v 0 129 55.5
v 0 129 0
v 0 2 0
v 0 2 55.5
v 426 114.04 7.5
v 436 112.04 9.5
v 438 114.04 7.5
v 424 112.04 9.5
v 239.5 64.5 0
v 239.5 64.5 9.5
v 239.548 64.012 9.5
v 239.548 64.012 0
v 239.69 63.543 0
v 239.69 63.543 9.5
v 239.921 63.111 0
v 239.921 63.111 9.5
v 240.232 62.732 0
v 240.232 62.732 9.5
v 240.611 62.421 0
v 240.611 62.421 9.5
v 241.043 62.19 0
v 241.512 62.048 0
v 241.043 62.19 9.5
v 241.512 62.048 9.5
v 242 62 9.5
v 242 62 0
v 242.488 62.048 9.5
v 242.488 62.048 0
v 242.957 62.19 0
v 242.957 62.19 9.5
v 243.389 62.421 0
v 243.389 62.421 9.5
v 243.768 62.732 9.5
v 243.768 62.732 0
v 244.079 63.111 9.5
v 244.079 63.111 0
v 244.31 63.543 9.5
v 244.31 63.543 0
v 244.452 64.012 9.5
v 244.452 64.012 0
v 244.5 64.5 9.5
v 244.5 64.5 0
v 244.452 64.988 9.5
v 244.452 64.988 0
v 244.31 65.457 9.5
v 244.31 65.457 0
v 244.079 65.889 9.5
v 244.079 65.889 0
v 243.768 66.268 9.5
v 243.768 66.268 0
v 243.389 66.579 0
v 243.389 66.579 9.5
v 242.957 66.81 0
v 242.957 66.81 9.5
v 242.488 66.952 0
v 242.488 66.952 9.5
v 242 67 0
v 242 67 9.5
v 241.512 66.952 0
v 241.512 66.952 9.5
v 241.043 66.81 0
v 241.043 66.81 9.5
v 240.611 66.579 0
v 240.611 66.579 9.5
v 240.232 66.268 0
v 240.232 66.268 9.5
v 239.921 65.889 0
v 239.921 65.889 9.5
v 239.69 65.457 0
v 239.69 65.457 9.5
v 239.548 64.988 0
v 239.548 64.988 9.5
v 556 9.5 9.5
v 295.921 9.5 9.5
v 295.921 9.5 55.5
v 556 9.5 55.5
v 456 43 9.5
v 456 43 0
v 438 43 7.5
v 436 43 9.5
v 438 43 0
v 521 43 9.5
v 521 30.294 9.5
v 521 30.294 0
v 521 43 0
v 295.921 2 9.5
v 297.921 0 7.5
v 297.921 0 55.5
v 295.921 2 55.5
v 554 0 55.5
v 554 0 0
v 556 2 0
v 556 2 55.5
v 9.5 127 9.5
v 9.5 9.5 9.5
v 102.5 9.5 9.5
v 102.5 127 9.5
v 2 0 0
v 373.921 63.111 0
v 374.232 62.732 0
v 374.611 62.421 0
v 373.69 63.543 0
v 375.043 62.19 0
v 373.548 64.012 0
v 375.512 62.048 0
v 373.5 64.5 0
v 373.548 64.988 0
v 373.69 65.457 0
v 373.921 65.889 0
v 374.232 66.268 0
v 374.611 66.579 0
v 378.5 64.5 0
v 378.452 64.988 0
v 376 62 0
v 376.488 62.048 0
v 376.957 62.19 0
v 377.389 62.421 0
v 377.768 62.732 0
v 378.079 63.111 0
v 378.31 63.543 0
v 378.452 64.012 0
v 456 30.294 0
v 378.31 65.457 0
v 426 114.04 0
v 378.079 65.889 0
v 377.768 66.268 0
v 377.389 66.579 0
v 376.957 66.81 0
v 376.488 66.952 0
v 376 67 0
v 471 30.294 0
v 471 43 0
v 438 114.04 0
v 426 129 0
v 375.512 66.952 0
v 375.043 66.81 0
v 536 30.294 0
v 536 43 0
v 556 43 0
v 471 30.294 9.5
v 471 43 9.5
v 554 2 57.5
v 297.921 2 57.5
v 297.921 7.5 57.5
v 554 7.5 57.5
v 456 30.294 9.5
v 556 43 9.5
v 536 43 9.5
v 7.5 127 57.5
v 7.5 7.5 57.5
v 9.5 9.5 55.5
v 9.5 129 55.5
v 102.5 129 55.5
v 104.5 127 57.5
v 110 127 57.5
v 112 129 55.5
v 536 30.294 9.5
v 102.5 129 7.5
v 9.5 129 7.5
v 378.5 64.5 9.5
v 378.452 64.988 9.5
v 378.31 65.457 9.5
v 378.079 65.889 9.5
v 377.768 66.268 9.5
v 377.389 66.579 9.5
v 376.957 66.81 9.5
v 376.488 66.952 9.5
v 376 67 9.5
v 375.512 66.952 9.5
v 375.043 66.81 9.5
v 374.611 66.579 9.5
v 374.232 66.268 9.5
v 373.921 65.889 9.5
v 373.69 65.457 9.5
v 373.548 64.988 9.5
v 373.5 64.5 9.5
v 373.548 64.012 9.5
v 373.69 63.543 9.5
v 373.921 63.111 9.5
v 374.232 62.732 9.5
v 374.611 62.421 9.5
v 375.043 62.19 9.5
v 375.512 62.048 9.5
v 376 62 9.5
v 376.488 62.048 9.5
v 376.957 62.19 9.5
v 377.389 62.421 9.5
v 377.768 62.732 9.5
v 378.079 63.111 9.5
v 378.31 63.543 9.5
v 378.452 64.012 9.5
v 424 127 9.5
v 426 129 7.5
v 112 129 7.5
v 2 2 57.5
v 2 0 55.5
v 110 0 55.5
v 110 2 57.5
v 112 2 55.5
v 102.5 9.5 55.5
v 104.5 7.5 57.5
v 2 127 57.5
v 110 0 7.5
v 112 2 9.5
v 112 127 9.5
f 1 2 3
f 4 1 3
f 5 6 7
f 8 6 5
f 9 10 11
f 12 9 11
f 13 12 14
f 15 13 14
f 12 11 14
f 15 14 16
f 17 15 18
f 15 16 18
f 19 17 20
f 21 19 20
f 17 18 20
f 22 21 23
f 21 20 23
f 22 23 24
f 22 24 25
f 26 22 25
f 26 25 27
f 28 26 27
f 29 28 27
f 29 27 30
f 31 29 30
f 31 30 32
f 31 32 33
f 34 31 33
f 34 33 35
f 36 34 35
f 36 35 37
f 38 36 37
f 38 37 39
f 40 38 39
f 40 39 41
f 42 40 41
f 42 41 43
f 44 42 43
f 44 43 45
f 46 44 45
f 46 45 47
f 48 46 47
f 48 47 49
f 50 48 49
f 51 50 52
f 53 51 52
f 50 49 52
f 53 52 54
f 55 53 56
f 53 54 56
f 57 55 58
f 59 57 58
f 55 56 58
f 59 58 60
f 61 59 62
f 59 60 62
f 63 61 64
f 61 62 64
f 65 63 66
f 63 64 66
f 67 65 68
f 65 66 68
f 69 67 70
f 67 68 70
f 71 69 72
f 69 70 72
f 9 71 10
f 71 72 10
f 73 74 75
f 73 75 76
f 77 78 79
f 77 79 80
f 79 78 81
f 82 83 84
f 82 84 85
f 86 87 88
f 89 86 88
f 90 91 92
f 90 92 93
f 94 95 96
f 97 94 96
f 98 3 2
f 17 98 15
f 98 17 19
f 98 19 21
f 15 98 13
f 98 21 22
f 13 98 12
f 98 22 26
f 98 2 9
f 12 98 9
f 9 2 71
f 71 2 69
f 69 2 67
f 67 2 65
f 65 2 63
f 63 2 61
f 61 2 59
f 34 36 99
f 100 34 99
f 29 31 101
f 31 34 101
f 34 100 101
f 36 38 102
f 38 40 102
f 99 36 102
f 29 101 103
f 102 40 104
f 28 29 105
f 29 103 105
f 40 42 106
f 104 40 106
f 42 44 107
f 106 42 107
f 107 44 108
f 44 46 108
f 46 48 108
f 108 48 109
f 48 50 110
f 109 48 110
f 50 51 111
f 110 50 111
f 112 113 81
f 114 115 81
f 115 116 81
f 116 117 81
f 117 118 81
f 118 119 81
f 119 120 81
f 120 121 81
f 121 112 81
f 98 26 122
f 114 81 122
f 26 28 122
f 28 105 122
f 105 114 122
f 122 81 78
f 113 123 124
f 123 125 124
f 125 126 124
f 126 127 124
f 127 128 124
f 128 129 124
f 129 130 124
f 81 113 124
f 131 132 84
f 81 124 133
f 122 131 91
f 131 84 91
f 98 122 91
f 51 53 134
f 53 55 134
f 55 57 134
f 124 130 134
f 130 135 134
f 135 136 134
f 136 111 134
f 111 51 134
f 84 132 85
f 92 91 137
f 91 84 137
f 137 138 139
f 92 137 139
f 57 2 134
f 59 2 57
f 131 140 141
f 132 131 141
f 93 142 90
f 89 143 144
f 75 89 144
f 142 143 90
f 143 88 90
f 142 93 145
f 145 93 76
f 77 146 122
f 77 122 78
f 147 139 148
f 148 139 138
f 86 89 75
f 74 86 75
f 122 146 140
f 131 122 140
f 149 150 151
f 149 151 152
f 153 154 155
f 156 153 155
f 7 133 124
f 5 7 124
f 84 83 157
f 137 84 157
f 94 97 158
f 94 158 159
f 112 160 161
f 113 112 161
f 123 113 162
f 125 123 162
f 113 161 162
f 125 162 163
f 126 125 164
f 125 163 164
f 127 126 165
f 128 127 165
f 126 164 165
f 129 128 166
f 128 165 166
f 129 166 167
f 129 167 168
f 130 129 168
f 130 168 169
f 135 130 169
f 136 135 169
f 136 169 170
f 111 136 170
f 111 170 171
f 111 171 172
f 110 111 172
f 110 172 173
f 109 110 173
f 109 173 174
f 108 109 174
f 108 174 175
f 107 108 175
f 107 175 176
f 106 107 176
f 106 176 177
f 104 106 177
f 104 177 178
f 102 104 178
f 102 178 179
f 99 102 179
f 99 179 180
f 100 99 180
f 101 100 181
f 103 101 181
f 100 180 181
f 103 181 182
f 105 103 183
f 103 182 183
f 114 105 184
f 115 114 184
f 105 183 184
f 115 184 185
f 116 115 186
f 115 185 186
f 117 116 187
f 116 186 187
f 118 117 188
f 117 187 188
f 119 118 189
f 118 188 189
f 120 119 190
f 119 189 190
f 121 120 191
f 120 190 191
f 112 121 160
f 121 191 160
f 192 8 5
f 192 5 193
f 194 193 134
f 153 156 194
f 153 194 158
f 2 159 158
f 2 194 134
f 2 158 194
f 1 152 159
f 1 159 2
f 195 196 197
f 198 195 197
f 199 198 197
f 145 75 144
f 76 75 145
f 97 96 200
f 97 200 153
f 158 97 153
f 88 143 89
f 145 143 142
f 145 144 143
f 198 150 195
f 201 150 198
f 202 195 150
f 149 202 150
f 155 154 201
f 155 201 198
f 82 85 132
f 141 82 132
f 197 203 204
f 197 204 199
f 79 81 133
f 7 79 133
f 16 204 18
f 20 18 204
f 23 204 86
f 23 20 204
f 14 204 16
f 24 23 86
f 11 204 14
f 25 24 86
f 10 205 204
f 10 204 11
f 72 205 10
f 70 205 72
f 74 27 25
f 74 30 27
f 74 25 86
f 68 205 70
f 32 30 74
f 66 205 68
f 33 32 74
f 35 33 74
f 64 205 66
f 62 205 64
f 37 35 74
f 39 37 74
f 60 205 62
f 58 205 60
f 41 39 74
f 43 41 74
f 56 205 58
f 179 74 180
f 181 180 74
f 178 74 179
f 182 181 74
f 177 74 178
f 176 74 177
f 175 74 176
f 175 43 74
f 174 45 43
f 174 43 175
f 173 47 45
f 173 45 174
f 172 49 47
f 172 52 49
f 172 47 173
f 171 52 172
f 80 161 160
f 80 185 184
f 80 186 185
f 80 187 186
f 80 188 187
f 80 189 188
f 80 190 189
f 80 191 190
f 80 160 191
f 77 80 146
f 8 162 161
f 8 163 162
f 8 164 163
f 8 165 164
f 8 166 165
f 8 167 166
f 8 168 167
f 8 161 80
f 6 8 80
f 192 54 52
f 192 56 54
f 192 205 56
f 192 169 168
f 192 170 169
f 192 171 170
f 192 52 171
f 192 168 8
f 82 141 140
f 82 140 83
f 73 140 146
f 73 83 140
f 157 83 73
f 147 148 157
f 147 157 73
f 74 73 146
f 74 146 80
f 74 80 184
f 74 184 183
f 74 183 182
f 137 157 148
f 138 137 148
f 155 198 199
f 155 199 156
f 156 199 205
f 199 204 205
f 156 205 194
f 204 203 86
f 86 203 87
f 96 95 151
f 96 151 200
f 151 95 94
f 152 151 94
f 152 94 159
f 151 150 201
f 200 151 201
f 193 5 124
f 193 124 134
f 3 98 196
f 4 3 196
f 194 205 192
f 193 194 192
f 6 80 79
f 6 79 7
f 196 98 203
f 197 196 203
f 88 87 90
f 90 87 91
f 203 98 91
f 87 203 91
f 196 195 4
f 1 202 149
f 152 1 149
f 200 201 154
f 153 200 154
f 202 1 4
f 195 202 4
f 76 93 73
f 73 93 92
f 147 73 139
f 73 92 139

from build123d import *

# Parameters (mm, degrees)
F1_DEPTH  = 9.5
F2_W      = 9.5
F2_H      = 119.5
F2_H_2    = 9.5
F2_W_2    = 93
F3_DEPTH  = 48
F5_DEPTH  = 9.5
F6_R      = 2.5
F7_DEPTH  = 25.4
F8_W      = 15
F8_H      = 12.7057269514
F9_DEPTH  = 9.501
F10_W     = 260.0785551071
F10_H     = 9.5
F11_DEPTH = 48
F12_SIZE  = 2


# Not quite as in the source:
# - a feature names something its author has since deleted; it is built from what else it names


with BuildPart() as f1:
    # F0 (on Top) → F1 (new body)
    with BuildSketch(Plane.XY):
        Polygon((0, 129), (0, 0), (556, 0), (556, 43), (438, 43), (438, 114.0399202704), (426, 114.0399202704), (426, 33.5), (310, 33.5), (310, 83.1064879894), (302.5, 83.1064879894), (302.5, 129), align=None)
    extrude(amount=F1_DEPTH)

    # F2 (on face) → F3 (join)
    with BuildSketch(Plane.XY.offset(9.5)):
        with Locations((4.75, 69.25)):
            Rectangle(F2_W, F2_H)
        with Locations((4.75, 4.75)):
            Rectangle(F2_W, F2_H_2)
        with Locations((56, 4.75)):
            Rectangle(F2_W_2, F2_H_2)
        with Locations((107.25, 69.25)):
            Rectangle(F2_W, F2_H)
        with Locations((107.25, 4.75)):
            Rectangle(F2_W, F2_H_2)
    extrude(amount=F3_DEPTH)

    # F4 (on face) → F5 (join)
    with BuildSketch(Plane.XY.offset(9.5)):
        Polygon((426, 129), (302.5, 129), (302.5, 83.1064879894), (310, 83.1064879894), (310, 33.5), (426, 33.5), align=None)
    extrude(amount=-F5_DEPTH)

    # F6 (on face) → F7 (cut)
    with BuildSketch(Plane.XY.offset(9.5)):
        with BuildLine():
            ThreePointArc((244.5, 64.5), (242, 67), (239.5, 64.5))
            Line((239.5, 64.5), (244.5, 64.5))
        make_face()
        with BuildLine():
            Line((244.5, 64.5), (239.5, 64.5))
            ThreePointArc((239.5, 64.5), (242, 62), (244.5, 64.5))
        make_face()
        with Locations((376, 64.5)):
            Circle(F6_R)
    extrude(amount=-F7_DEPTH, mode=Mode.SUBTRACT)

    # F8 (on face) → F9 (cut, through all)
    with BuildSketch(Plane.XY.offset(9.5)):
        with Locations((463.5, 36.6471365243)):
            Rectangle(F8_W, F8_H)
        with Locations((528.5, 36.6471365243)):
            Rectangle(F8_W, F8_H)
    extrude(amount=-F9_DEPTH, mode=Mode.SUBTRACT)

    # F10 (on face) → F11 (join)
    with BuildSketch(Plane.XY.offset(9.5)):
        with Locations((425.9607224464, 4.75)):
            Rectangle(F10_W, F10_H)
    extrude(amount=F11_DEPTH)

    # F12
    f12_edges = [f1.edges().sort_by_distance(p)[0] for p in [
        (0, 64.5, 57.5),
        (9.5, 69.25, 57.5),
        (56, 0, 57.5),
        (56, 9.5, 57.5),
        (102.5, 69.25, 57.5),
        (112, 64.5, 57.5),
        (107.25, 129, 57.5),
        (4.75, 129, 57.5),
        (56, 129, 9.5),
        (269, 129, 9.5),
        (203.960722, 0, 9.5),
        (425.960722, 0, 57.5),
        (425.960722, 9.5, 57.5),
        (556, 4.75, 57.5),
        (438, 78.51996, 9.5),
        (426, 121.51996, 9.5),
        (432, 114.03992, 9.5),
        (112, 0, 33.5),
        (0, 0, 28.75),
        (295.921445, 4.75, 57.5),
        (295.921445, 0, 33.5),
        (556, 0, 28.75),
    ]]
    chamfer(f12_edges, length=F12_SIZE)


solid = f1.part
